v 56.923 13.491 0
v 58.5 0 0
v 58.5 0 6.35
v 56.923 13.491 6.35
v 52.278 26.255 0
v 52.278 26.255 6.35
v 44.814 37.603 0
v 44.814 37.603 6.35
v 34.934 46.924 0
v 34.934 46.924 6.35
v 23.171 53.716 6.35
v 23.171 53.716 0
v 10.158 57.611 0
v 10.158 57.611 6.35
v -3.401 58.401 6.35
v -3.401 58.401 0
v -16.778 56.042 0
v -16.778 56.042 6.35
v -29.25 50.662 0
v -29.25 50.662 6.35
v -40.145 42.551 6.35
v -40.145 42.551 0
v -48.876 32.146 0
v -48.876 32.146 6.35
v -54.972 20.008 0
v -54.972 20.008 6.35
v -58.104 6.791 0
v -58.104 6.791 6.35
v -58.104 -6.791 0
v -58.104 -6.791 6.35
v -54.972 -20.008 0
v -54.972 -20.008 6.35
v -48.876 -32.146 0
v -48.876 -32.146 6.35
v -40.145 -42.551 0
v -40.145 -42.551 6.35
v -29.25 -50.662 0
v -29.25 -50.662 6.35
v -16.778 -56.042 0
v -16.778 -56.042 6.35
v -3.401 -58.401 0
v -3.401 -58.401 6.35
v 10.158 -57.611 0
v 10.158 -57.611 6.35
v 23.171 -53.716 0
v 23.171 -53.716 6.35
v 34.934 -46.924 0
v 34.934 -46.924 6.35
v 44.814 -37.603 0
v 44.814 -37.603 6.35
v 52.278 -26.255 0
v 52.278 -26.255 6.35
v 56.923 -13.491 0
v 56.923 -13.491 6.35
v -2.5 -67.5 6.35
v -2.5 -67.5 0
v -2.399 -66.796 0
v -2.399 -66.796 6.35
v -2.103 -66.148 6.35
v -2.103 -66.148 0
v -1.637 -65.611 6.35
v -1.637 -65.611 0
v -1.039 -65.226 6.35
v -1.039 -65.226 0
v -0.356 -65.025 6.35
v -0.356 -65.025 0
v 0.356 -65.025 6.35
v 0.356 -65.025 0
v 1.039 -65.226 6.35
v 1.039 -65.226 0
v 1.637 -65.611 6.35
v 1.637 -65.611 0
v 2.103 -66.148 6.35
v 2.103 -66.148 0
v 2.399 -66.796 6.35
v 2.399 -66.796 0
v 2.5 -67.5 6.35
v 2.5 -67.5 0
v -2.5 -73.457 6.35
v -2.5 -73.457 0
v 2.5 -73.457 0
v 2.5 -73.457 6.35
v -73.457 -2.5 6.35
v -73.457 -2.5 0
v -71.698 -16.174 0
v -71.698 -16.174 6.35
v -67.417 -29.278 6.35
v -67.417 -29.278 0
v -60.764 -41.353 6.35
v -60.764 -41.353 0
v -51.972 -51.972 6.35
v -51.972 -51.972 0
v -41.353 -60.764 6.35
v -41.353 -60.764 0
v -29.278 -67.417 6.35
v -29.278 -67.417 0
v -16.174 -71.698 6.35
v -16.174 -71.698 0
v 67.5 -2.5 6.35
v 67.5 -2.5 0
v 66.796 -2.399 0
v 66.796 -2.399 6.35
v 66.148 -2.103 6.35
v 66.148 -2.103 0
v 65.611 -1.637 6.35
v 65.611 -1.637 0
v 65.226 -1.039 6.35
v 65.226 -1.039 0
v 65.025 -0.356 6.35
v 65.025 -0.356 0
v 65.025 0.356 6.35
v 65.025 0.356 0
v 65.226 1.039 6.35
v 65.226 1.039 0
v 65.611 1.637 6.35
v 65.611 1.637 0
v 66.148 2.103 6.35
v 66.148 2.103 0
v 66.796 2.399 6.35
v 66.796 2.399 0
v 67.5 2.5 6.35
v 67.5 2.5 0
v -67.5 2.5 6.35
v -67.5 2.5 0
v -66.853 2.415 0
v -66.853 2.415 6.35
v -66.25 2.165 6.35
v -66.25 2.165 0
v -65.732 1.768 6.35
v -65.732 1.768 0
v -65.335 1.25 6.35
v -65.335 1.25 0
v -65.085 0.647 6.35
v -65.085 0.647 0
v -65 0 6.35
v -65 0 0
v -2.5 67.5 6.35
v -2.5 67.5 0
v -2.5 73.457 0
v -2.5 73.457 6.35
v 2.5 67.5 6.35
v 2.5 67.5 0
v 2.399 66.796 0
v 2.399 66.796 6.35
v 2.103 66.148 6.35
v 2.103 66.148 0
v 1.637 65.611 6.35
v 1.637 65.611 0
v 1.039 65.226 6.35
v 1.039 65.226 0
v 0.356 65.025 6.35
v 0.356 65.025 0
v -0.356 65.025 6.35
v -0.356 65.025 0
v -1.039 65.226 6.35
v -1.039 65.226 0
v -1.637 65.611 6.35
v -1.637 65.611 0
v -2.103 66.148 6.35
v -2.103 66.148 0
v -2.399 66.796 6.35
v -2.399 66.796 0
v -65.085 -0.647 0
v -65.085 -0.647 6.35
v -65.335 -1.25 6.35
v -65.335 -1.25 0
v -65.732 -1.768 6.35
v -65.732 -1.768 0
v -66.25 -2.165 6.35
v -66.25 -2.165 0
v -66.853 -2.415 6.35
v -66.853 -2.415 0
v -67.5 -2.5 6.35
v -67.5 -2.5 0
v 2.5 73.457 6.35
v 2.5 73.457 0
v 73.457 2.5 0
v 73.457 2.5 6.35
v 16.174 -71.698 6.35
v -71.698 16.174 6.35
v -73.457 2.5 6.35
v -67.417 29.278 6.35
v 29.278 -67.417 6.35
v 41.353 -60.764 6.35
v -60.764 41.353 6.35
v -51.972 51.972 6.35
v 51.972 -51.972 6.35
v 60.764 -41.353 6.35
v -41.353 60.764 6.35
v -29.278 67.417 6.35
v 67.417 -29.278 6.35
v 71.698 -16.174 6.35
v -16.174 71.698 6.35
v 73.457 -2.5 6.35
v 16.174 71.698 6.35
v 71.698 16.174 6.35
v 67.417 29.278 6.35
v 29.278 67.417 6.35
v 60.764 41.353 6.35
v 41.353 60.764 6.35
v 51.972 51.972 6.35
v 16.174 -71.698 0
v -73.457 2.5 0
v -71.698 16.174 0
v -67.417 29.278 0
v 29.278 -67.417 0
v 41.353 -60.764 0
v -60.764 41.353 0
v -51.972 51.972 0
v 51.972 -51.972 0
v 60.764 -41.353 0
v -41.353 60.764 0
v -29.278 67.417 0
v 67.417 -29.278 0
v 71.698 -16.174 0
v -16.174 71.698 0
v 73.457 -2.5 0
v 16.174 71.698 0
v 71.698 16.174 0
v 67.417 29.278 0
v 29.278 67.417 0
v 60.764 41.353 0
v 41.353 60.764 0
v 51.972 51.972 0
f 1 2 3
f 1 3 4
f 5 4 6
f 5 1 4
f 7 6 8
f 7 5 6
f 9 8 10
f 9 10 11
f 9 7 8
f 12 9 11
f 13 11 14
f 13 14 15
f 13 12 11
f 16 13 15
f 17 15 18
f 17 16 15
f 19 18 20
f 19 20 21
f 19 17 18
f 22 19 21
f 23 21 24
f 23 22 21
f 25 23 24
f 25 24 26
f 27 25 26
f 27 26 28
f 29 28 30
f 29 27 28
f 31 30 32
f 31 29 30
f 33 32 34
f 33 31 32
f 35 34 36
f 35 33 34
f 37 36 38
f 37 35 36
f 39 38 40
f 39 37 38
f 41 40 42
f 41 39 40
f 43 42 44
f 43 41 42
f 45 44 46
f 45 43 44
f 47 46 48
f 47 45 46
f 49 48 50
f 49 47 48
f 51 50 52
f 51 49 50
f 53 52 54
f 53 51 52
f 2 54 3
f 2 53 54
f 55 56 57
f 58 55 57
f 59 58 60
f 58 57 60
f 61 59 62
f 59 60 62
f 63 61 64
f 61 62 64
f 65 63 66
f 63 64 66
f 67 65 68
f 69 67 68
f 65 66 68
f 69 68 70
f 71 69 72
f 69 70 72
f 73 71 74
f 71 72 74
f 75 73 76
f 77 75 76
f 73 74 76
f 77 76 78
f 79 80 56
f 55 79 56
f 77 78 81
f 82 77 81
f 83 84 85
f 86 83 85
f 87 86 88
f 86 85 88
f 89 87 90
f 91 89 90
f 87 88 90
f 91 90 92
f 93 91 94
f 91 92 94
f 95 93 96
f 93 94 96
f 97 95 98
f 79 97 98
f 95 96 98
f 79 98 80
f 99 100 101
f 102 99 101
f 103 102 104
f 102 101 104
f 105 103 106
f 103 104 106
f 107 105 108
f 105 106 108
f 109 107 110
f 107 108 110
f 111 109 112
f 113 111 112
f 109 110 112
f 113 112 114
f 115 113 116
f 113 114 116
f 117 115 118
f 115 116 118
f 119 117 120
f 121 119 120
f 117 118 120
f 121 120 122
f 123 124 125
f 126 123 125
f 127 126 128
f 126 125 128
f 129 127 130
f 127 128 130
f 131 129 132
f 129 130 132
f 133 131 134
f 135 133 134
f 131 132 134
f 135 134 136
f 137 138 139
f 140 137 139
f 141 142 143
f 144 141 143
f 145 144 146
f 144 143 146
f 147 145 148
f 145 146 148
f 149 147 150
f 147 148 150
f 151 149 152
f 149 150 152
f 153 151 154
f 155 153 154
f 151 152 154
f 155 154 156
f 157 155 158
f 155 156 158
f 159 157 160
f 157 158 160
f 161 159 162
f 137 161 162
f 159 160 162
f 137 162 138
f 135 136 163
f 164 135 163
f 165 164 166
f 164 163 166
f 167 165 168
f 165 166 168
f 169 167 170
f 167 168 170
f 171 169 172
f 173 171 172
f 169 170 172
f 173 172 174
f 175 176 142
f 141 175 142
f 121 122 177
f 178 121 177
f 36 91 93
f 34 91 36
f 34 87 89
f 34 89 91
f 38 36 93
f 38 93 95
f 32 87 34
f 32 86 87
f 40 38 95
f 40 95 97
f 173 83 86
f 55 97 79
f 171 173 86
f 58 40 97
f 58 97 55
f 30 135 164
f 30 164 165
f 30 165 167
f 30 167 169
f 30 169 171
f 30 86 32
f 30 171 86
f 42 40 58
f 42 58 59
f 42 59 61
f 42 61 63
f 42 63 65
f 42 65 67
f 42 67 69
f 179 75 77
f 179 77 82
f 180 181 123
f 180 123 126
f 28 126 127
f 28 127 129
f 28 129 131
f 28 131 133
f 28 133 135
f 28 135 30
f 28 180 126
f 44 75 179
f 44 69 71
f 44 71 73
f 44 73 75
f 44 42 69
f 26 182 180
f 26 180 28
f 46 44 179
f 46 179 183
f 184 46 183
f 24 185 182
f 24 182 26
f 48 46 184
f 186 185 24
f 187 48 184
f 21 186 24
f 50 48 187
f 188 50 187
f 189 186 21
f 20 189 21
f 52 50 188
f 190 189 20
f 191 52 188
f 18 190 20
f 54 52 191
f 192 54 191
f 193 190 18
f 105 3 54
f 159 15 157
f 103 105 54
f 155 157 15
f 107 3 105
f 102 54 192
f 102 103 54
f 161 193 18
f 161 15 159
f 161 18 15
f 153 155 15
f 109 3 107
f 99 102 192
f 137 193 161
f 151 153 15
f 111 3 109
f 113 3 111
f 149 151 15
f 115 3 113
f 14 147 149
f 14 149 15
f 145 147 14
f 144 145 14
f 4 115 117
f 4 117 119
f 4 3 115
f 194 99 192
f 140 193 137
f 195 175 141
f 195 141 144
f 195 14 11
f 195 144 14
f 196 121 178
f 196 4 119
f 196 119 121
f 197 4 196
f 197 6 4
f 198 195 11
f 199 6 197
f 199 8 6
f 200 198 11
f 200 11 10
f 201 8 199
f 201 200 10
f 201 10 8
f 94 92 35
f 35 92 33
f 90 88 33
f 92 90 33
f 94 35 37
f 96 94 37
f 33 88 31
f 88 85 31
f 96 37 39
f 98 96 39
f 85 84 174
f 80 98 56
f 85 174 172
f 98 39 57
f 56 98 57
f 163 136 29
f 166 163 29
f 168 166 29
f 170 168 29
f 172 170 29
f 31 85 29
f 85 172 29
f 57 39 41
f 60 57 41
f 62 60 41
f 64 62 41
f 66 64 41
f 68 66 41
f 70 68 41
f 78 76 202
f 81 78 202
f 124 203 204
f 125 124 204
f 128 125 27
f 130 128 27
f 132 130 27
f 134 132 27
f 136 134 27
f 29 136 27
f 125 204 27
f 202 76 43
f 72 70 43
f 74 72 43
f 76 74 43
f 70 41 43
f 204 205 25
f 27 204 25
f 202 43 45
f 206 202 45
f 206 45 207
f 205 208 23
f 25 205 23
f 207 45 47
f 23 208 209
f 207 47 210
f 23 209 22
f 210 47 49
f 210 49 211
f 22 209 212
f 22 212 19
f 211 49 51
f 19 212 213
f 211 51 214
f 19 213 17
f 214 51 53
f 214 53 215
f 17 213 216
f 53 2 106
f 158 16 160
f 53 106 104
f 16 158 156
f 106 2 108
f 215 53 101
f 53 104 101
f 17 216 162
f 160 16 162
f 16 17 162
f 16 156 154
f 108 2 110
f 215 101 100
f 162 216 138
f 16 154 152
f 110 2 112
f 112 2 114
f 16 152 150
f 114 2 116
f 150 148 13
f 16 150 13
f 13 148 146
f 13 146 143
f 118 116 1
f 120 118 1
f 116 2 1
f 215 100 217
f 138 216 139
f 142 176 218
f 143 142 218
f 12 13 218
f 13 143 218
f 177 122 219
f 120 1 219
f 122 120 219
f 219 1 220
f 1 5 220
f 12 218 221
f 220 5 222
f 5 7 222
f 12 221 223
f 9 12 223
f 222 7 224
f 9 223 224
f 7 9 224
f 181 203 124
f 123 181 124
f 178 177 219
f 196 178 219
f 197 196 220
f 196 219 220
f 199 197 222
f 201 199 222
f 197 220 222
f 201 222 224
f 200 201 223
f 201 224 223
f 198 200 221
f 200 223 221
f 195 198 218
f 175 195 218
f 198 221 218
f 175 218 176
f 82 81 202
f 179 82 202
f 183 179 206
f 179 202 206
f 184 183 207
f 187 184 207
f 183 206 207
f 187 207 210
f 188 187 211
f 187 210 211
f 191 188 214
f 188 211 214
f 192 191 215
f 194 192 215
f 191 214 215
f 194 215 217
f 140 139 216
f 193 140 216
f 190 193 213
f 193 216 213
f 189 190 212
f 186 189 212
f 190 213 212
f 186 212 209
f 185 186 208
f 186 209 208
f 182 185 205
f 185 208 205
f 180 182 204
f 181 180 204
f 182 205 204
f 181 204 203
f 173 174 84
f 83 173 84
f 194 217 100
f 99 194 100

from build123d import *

# Parameters (mm, degrees)
F0_R     = 58.5
F1_DEPTH = 6.35


# Not quite as in the source:
# - a length typed as a fraction of an inch, garbled in the dataset ("3 / 203.2 mm" for 3/8 in), is restored


with BuildPart() as f1:
    # F0 (on Top) → F1 (new body)
    with BuildSketch(Plane.XY):
        with BuildLine():
            Line((67.5, 2.5), (73.4574706888, 2.5))
            ThreePointArc((73.4574706888, 2.5), (51.9723484172, 51.9723484172), (2.5, 73.4574706888))
            Line((2.5, 73.4574706888), (2.5, 67.5))
            ThreePointArc((2.5, 67.5), (0, 65), (-2.5, 67.5))
            Line((-2.5, 67.5), (-2.5, 73.4574706888))
            ThreePointArc((-2.5, 73.4574706888), (-51.9723484172, 51.9723484172), (-73.4574706888, 2.5))
            Line((-73.4574706888, 2.5), (-67.5, 2.5))
            ThreePointArc((-67.5, 2.5), (-65.732233047, 1.767766953), (-65, 0))
            ThreePointArc((-65, 0), (-65.732233047, -1.767766953), (-67.5, -2.5))
            Line((-67.5, -2.5), (-73.4574706888, -2.5))
            ThreePointArc((-73.4574706888, -2.5), (-51.9723484172, -51.9723484172), (-2.5, -73.4574706888))
            Line((-2.5, -73.4574706888), (-2.5, -67.5))
            ThreePointArc((-2.5, -67.5), (0, -65), (2.5, -67.5))
            Line((2.5, -67.5), (2.5, -73.4574706888))
            ThreePointArc((2.5, -73.4574706888), (51.9723484172, -51.9723484172), (73.4574706888, -2.5))
            Line((73.4574706888, -2.5), (67.5, -2.5))
            ThreePointArc((67.5, -2.5), (65, 0), (67.5, 2.5))
        make_face()
        Circle(F0_R, mode=Mode.SUBTRACT)
    extrude(amount=F1_DEPTH)


solid = f1.part
